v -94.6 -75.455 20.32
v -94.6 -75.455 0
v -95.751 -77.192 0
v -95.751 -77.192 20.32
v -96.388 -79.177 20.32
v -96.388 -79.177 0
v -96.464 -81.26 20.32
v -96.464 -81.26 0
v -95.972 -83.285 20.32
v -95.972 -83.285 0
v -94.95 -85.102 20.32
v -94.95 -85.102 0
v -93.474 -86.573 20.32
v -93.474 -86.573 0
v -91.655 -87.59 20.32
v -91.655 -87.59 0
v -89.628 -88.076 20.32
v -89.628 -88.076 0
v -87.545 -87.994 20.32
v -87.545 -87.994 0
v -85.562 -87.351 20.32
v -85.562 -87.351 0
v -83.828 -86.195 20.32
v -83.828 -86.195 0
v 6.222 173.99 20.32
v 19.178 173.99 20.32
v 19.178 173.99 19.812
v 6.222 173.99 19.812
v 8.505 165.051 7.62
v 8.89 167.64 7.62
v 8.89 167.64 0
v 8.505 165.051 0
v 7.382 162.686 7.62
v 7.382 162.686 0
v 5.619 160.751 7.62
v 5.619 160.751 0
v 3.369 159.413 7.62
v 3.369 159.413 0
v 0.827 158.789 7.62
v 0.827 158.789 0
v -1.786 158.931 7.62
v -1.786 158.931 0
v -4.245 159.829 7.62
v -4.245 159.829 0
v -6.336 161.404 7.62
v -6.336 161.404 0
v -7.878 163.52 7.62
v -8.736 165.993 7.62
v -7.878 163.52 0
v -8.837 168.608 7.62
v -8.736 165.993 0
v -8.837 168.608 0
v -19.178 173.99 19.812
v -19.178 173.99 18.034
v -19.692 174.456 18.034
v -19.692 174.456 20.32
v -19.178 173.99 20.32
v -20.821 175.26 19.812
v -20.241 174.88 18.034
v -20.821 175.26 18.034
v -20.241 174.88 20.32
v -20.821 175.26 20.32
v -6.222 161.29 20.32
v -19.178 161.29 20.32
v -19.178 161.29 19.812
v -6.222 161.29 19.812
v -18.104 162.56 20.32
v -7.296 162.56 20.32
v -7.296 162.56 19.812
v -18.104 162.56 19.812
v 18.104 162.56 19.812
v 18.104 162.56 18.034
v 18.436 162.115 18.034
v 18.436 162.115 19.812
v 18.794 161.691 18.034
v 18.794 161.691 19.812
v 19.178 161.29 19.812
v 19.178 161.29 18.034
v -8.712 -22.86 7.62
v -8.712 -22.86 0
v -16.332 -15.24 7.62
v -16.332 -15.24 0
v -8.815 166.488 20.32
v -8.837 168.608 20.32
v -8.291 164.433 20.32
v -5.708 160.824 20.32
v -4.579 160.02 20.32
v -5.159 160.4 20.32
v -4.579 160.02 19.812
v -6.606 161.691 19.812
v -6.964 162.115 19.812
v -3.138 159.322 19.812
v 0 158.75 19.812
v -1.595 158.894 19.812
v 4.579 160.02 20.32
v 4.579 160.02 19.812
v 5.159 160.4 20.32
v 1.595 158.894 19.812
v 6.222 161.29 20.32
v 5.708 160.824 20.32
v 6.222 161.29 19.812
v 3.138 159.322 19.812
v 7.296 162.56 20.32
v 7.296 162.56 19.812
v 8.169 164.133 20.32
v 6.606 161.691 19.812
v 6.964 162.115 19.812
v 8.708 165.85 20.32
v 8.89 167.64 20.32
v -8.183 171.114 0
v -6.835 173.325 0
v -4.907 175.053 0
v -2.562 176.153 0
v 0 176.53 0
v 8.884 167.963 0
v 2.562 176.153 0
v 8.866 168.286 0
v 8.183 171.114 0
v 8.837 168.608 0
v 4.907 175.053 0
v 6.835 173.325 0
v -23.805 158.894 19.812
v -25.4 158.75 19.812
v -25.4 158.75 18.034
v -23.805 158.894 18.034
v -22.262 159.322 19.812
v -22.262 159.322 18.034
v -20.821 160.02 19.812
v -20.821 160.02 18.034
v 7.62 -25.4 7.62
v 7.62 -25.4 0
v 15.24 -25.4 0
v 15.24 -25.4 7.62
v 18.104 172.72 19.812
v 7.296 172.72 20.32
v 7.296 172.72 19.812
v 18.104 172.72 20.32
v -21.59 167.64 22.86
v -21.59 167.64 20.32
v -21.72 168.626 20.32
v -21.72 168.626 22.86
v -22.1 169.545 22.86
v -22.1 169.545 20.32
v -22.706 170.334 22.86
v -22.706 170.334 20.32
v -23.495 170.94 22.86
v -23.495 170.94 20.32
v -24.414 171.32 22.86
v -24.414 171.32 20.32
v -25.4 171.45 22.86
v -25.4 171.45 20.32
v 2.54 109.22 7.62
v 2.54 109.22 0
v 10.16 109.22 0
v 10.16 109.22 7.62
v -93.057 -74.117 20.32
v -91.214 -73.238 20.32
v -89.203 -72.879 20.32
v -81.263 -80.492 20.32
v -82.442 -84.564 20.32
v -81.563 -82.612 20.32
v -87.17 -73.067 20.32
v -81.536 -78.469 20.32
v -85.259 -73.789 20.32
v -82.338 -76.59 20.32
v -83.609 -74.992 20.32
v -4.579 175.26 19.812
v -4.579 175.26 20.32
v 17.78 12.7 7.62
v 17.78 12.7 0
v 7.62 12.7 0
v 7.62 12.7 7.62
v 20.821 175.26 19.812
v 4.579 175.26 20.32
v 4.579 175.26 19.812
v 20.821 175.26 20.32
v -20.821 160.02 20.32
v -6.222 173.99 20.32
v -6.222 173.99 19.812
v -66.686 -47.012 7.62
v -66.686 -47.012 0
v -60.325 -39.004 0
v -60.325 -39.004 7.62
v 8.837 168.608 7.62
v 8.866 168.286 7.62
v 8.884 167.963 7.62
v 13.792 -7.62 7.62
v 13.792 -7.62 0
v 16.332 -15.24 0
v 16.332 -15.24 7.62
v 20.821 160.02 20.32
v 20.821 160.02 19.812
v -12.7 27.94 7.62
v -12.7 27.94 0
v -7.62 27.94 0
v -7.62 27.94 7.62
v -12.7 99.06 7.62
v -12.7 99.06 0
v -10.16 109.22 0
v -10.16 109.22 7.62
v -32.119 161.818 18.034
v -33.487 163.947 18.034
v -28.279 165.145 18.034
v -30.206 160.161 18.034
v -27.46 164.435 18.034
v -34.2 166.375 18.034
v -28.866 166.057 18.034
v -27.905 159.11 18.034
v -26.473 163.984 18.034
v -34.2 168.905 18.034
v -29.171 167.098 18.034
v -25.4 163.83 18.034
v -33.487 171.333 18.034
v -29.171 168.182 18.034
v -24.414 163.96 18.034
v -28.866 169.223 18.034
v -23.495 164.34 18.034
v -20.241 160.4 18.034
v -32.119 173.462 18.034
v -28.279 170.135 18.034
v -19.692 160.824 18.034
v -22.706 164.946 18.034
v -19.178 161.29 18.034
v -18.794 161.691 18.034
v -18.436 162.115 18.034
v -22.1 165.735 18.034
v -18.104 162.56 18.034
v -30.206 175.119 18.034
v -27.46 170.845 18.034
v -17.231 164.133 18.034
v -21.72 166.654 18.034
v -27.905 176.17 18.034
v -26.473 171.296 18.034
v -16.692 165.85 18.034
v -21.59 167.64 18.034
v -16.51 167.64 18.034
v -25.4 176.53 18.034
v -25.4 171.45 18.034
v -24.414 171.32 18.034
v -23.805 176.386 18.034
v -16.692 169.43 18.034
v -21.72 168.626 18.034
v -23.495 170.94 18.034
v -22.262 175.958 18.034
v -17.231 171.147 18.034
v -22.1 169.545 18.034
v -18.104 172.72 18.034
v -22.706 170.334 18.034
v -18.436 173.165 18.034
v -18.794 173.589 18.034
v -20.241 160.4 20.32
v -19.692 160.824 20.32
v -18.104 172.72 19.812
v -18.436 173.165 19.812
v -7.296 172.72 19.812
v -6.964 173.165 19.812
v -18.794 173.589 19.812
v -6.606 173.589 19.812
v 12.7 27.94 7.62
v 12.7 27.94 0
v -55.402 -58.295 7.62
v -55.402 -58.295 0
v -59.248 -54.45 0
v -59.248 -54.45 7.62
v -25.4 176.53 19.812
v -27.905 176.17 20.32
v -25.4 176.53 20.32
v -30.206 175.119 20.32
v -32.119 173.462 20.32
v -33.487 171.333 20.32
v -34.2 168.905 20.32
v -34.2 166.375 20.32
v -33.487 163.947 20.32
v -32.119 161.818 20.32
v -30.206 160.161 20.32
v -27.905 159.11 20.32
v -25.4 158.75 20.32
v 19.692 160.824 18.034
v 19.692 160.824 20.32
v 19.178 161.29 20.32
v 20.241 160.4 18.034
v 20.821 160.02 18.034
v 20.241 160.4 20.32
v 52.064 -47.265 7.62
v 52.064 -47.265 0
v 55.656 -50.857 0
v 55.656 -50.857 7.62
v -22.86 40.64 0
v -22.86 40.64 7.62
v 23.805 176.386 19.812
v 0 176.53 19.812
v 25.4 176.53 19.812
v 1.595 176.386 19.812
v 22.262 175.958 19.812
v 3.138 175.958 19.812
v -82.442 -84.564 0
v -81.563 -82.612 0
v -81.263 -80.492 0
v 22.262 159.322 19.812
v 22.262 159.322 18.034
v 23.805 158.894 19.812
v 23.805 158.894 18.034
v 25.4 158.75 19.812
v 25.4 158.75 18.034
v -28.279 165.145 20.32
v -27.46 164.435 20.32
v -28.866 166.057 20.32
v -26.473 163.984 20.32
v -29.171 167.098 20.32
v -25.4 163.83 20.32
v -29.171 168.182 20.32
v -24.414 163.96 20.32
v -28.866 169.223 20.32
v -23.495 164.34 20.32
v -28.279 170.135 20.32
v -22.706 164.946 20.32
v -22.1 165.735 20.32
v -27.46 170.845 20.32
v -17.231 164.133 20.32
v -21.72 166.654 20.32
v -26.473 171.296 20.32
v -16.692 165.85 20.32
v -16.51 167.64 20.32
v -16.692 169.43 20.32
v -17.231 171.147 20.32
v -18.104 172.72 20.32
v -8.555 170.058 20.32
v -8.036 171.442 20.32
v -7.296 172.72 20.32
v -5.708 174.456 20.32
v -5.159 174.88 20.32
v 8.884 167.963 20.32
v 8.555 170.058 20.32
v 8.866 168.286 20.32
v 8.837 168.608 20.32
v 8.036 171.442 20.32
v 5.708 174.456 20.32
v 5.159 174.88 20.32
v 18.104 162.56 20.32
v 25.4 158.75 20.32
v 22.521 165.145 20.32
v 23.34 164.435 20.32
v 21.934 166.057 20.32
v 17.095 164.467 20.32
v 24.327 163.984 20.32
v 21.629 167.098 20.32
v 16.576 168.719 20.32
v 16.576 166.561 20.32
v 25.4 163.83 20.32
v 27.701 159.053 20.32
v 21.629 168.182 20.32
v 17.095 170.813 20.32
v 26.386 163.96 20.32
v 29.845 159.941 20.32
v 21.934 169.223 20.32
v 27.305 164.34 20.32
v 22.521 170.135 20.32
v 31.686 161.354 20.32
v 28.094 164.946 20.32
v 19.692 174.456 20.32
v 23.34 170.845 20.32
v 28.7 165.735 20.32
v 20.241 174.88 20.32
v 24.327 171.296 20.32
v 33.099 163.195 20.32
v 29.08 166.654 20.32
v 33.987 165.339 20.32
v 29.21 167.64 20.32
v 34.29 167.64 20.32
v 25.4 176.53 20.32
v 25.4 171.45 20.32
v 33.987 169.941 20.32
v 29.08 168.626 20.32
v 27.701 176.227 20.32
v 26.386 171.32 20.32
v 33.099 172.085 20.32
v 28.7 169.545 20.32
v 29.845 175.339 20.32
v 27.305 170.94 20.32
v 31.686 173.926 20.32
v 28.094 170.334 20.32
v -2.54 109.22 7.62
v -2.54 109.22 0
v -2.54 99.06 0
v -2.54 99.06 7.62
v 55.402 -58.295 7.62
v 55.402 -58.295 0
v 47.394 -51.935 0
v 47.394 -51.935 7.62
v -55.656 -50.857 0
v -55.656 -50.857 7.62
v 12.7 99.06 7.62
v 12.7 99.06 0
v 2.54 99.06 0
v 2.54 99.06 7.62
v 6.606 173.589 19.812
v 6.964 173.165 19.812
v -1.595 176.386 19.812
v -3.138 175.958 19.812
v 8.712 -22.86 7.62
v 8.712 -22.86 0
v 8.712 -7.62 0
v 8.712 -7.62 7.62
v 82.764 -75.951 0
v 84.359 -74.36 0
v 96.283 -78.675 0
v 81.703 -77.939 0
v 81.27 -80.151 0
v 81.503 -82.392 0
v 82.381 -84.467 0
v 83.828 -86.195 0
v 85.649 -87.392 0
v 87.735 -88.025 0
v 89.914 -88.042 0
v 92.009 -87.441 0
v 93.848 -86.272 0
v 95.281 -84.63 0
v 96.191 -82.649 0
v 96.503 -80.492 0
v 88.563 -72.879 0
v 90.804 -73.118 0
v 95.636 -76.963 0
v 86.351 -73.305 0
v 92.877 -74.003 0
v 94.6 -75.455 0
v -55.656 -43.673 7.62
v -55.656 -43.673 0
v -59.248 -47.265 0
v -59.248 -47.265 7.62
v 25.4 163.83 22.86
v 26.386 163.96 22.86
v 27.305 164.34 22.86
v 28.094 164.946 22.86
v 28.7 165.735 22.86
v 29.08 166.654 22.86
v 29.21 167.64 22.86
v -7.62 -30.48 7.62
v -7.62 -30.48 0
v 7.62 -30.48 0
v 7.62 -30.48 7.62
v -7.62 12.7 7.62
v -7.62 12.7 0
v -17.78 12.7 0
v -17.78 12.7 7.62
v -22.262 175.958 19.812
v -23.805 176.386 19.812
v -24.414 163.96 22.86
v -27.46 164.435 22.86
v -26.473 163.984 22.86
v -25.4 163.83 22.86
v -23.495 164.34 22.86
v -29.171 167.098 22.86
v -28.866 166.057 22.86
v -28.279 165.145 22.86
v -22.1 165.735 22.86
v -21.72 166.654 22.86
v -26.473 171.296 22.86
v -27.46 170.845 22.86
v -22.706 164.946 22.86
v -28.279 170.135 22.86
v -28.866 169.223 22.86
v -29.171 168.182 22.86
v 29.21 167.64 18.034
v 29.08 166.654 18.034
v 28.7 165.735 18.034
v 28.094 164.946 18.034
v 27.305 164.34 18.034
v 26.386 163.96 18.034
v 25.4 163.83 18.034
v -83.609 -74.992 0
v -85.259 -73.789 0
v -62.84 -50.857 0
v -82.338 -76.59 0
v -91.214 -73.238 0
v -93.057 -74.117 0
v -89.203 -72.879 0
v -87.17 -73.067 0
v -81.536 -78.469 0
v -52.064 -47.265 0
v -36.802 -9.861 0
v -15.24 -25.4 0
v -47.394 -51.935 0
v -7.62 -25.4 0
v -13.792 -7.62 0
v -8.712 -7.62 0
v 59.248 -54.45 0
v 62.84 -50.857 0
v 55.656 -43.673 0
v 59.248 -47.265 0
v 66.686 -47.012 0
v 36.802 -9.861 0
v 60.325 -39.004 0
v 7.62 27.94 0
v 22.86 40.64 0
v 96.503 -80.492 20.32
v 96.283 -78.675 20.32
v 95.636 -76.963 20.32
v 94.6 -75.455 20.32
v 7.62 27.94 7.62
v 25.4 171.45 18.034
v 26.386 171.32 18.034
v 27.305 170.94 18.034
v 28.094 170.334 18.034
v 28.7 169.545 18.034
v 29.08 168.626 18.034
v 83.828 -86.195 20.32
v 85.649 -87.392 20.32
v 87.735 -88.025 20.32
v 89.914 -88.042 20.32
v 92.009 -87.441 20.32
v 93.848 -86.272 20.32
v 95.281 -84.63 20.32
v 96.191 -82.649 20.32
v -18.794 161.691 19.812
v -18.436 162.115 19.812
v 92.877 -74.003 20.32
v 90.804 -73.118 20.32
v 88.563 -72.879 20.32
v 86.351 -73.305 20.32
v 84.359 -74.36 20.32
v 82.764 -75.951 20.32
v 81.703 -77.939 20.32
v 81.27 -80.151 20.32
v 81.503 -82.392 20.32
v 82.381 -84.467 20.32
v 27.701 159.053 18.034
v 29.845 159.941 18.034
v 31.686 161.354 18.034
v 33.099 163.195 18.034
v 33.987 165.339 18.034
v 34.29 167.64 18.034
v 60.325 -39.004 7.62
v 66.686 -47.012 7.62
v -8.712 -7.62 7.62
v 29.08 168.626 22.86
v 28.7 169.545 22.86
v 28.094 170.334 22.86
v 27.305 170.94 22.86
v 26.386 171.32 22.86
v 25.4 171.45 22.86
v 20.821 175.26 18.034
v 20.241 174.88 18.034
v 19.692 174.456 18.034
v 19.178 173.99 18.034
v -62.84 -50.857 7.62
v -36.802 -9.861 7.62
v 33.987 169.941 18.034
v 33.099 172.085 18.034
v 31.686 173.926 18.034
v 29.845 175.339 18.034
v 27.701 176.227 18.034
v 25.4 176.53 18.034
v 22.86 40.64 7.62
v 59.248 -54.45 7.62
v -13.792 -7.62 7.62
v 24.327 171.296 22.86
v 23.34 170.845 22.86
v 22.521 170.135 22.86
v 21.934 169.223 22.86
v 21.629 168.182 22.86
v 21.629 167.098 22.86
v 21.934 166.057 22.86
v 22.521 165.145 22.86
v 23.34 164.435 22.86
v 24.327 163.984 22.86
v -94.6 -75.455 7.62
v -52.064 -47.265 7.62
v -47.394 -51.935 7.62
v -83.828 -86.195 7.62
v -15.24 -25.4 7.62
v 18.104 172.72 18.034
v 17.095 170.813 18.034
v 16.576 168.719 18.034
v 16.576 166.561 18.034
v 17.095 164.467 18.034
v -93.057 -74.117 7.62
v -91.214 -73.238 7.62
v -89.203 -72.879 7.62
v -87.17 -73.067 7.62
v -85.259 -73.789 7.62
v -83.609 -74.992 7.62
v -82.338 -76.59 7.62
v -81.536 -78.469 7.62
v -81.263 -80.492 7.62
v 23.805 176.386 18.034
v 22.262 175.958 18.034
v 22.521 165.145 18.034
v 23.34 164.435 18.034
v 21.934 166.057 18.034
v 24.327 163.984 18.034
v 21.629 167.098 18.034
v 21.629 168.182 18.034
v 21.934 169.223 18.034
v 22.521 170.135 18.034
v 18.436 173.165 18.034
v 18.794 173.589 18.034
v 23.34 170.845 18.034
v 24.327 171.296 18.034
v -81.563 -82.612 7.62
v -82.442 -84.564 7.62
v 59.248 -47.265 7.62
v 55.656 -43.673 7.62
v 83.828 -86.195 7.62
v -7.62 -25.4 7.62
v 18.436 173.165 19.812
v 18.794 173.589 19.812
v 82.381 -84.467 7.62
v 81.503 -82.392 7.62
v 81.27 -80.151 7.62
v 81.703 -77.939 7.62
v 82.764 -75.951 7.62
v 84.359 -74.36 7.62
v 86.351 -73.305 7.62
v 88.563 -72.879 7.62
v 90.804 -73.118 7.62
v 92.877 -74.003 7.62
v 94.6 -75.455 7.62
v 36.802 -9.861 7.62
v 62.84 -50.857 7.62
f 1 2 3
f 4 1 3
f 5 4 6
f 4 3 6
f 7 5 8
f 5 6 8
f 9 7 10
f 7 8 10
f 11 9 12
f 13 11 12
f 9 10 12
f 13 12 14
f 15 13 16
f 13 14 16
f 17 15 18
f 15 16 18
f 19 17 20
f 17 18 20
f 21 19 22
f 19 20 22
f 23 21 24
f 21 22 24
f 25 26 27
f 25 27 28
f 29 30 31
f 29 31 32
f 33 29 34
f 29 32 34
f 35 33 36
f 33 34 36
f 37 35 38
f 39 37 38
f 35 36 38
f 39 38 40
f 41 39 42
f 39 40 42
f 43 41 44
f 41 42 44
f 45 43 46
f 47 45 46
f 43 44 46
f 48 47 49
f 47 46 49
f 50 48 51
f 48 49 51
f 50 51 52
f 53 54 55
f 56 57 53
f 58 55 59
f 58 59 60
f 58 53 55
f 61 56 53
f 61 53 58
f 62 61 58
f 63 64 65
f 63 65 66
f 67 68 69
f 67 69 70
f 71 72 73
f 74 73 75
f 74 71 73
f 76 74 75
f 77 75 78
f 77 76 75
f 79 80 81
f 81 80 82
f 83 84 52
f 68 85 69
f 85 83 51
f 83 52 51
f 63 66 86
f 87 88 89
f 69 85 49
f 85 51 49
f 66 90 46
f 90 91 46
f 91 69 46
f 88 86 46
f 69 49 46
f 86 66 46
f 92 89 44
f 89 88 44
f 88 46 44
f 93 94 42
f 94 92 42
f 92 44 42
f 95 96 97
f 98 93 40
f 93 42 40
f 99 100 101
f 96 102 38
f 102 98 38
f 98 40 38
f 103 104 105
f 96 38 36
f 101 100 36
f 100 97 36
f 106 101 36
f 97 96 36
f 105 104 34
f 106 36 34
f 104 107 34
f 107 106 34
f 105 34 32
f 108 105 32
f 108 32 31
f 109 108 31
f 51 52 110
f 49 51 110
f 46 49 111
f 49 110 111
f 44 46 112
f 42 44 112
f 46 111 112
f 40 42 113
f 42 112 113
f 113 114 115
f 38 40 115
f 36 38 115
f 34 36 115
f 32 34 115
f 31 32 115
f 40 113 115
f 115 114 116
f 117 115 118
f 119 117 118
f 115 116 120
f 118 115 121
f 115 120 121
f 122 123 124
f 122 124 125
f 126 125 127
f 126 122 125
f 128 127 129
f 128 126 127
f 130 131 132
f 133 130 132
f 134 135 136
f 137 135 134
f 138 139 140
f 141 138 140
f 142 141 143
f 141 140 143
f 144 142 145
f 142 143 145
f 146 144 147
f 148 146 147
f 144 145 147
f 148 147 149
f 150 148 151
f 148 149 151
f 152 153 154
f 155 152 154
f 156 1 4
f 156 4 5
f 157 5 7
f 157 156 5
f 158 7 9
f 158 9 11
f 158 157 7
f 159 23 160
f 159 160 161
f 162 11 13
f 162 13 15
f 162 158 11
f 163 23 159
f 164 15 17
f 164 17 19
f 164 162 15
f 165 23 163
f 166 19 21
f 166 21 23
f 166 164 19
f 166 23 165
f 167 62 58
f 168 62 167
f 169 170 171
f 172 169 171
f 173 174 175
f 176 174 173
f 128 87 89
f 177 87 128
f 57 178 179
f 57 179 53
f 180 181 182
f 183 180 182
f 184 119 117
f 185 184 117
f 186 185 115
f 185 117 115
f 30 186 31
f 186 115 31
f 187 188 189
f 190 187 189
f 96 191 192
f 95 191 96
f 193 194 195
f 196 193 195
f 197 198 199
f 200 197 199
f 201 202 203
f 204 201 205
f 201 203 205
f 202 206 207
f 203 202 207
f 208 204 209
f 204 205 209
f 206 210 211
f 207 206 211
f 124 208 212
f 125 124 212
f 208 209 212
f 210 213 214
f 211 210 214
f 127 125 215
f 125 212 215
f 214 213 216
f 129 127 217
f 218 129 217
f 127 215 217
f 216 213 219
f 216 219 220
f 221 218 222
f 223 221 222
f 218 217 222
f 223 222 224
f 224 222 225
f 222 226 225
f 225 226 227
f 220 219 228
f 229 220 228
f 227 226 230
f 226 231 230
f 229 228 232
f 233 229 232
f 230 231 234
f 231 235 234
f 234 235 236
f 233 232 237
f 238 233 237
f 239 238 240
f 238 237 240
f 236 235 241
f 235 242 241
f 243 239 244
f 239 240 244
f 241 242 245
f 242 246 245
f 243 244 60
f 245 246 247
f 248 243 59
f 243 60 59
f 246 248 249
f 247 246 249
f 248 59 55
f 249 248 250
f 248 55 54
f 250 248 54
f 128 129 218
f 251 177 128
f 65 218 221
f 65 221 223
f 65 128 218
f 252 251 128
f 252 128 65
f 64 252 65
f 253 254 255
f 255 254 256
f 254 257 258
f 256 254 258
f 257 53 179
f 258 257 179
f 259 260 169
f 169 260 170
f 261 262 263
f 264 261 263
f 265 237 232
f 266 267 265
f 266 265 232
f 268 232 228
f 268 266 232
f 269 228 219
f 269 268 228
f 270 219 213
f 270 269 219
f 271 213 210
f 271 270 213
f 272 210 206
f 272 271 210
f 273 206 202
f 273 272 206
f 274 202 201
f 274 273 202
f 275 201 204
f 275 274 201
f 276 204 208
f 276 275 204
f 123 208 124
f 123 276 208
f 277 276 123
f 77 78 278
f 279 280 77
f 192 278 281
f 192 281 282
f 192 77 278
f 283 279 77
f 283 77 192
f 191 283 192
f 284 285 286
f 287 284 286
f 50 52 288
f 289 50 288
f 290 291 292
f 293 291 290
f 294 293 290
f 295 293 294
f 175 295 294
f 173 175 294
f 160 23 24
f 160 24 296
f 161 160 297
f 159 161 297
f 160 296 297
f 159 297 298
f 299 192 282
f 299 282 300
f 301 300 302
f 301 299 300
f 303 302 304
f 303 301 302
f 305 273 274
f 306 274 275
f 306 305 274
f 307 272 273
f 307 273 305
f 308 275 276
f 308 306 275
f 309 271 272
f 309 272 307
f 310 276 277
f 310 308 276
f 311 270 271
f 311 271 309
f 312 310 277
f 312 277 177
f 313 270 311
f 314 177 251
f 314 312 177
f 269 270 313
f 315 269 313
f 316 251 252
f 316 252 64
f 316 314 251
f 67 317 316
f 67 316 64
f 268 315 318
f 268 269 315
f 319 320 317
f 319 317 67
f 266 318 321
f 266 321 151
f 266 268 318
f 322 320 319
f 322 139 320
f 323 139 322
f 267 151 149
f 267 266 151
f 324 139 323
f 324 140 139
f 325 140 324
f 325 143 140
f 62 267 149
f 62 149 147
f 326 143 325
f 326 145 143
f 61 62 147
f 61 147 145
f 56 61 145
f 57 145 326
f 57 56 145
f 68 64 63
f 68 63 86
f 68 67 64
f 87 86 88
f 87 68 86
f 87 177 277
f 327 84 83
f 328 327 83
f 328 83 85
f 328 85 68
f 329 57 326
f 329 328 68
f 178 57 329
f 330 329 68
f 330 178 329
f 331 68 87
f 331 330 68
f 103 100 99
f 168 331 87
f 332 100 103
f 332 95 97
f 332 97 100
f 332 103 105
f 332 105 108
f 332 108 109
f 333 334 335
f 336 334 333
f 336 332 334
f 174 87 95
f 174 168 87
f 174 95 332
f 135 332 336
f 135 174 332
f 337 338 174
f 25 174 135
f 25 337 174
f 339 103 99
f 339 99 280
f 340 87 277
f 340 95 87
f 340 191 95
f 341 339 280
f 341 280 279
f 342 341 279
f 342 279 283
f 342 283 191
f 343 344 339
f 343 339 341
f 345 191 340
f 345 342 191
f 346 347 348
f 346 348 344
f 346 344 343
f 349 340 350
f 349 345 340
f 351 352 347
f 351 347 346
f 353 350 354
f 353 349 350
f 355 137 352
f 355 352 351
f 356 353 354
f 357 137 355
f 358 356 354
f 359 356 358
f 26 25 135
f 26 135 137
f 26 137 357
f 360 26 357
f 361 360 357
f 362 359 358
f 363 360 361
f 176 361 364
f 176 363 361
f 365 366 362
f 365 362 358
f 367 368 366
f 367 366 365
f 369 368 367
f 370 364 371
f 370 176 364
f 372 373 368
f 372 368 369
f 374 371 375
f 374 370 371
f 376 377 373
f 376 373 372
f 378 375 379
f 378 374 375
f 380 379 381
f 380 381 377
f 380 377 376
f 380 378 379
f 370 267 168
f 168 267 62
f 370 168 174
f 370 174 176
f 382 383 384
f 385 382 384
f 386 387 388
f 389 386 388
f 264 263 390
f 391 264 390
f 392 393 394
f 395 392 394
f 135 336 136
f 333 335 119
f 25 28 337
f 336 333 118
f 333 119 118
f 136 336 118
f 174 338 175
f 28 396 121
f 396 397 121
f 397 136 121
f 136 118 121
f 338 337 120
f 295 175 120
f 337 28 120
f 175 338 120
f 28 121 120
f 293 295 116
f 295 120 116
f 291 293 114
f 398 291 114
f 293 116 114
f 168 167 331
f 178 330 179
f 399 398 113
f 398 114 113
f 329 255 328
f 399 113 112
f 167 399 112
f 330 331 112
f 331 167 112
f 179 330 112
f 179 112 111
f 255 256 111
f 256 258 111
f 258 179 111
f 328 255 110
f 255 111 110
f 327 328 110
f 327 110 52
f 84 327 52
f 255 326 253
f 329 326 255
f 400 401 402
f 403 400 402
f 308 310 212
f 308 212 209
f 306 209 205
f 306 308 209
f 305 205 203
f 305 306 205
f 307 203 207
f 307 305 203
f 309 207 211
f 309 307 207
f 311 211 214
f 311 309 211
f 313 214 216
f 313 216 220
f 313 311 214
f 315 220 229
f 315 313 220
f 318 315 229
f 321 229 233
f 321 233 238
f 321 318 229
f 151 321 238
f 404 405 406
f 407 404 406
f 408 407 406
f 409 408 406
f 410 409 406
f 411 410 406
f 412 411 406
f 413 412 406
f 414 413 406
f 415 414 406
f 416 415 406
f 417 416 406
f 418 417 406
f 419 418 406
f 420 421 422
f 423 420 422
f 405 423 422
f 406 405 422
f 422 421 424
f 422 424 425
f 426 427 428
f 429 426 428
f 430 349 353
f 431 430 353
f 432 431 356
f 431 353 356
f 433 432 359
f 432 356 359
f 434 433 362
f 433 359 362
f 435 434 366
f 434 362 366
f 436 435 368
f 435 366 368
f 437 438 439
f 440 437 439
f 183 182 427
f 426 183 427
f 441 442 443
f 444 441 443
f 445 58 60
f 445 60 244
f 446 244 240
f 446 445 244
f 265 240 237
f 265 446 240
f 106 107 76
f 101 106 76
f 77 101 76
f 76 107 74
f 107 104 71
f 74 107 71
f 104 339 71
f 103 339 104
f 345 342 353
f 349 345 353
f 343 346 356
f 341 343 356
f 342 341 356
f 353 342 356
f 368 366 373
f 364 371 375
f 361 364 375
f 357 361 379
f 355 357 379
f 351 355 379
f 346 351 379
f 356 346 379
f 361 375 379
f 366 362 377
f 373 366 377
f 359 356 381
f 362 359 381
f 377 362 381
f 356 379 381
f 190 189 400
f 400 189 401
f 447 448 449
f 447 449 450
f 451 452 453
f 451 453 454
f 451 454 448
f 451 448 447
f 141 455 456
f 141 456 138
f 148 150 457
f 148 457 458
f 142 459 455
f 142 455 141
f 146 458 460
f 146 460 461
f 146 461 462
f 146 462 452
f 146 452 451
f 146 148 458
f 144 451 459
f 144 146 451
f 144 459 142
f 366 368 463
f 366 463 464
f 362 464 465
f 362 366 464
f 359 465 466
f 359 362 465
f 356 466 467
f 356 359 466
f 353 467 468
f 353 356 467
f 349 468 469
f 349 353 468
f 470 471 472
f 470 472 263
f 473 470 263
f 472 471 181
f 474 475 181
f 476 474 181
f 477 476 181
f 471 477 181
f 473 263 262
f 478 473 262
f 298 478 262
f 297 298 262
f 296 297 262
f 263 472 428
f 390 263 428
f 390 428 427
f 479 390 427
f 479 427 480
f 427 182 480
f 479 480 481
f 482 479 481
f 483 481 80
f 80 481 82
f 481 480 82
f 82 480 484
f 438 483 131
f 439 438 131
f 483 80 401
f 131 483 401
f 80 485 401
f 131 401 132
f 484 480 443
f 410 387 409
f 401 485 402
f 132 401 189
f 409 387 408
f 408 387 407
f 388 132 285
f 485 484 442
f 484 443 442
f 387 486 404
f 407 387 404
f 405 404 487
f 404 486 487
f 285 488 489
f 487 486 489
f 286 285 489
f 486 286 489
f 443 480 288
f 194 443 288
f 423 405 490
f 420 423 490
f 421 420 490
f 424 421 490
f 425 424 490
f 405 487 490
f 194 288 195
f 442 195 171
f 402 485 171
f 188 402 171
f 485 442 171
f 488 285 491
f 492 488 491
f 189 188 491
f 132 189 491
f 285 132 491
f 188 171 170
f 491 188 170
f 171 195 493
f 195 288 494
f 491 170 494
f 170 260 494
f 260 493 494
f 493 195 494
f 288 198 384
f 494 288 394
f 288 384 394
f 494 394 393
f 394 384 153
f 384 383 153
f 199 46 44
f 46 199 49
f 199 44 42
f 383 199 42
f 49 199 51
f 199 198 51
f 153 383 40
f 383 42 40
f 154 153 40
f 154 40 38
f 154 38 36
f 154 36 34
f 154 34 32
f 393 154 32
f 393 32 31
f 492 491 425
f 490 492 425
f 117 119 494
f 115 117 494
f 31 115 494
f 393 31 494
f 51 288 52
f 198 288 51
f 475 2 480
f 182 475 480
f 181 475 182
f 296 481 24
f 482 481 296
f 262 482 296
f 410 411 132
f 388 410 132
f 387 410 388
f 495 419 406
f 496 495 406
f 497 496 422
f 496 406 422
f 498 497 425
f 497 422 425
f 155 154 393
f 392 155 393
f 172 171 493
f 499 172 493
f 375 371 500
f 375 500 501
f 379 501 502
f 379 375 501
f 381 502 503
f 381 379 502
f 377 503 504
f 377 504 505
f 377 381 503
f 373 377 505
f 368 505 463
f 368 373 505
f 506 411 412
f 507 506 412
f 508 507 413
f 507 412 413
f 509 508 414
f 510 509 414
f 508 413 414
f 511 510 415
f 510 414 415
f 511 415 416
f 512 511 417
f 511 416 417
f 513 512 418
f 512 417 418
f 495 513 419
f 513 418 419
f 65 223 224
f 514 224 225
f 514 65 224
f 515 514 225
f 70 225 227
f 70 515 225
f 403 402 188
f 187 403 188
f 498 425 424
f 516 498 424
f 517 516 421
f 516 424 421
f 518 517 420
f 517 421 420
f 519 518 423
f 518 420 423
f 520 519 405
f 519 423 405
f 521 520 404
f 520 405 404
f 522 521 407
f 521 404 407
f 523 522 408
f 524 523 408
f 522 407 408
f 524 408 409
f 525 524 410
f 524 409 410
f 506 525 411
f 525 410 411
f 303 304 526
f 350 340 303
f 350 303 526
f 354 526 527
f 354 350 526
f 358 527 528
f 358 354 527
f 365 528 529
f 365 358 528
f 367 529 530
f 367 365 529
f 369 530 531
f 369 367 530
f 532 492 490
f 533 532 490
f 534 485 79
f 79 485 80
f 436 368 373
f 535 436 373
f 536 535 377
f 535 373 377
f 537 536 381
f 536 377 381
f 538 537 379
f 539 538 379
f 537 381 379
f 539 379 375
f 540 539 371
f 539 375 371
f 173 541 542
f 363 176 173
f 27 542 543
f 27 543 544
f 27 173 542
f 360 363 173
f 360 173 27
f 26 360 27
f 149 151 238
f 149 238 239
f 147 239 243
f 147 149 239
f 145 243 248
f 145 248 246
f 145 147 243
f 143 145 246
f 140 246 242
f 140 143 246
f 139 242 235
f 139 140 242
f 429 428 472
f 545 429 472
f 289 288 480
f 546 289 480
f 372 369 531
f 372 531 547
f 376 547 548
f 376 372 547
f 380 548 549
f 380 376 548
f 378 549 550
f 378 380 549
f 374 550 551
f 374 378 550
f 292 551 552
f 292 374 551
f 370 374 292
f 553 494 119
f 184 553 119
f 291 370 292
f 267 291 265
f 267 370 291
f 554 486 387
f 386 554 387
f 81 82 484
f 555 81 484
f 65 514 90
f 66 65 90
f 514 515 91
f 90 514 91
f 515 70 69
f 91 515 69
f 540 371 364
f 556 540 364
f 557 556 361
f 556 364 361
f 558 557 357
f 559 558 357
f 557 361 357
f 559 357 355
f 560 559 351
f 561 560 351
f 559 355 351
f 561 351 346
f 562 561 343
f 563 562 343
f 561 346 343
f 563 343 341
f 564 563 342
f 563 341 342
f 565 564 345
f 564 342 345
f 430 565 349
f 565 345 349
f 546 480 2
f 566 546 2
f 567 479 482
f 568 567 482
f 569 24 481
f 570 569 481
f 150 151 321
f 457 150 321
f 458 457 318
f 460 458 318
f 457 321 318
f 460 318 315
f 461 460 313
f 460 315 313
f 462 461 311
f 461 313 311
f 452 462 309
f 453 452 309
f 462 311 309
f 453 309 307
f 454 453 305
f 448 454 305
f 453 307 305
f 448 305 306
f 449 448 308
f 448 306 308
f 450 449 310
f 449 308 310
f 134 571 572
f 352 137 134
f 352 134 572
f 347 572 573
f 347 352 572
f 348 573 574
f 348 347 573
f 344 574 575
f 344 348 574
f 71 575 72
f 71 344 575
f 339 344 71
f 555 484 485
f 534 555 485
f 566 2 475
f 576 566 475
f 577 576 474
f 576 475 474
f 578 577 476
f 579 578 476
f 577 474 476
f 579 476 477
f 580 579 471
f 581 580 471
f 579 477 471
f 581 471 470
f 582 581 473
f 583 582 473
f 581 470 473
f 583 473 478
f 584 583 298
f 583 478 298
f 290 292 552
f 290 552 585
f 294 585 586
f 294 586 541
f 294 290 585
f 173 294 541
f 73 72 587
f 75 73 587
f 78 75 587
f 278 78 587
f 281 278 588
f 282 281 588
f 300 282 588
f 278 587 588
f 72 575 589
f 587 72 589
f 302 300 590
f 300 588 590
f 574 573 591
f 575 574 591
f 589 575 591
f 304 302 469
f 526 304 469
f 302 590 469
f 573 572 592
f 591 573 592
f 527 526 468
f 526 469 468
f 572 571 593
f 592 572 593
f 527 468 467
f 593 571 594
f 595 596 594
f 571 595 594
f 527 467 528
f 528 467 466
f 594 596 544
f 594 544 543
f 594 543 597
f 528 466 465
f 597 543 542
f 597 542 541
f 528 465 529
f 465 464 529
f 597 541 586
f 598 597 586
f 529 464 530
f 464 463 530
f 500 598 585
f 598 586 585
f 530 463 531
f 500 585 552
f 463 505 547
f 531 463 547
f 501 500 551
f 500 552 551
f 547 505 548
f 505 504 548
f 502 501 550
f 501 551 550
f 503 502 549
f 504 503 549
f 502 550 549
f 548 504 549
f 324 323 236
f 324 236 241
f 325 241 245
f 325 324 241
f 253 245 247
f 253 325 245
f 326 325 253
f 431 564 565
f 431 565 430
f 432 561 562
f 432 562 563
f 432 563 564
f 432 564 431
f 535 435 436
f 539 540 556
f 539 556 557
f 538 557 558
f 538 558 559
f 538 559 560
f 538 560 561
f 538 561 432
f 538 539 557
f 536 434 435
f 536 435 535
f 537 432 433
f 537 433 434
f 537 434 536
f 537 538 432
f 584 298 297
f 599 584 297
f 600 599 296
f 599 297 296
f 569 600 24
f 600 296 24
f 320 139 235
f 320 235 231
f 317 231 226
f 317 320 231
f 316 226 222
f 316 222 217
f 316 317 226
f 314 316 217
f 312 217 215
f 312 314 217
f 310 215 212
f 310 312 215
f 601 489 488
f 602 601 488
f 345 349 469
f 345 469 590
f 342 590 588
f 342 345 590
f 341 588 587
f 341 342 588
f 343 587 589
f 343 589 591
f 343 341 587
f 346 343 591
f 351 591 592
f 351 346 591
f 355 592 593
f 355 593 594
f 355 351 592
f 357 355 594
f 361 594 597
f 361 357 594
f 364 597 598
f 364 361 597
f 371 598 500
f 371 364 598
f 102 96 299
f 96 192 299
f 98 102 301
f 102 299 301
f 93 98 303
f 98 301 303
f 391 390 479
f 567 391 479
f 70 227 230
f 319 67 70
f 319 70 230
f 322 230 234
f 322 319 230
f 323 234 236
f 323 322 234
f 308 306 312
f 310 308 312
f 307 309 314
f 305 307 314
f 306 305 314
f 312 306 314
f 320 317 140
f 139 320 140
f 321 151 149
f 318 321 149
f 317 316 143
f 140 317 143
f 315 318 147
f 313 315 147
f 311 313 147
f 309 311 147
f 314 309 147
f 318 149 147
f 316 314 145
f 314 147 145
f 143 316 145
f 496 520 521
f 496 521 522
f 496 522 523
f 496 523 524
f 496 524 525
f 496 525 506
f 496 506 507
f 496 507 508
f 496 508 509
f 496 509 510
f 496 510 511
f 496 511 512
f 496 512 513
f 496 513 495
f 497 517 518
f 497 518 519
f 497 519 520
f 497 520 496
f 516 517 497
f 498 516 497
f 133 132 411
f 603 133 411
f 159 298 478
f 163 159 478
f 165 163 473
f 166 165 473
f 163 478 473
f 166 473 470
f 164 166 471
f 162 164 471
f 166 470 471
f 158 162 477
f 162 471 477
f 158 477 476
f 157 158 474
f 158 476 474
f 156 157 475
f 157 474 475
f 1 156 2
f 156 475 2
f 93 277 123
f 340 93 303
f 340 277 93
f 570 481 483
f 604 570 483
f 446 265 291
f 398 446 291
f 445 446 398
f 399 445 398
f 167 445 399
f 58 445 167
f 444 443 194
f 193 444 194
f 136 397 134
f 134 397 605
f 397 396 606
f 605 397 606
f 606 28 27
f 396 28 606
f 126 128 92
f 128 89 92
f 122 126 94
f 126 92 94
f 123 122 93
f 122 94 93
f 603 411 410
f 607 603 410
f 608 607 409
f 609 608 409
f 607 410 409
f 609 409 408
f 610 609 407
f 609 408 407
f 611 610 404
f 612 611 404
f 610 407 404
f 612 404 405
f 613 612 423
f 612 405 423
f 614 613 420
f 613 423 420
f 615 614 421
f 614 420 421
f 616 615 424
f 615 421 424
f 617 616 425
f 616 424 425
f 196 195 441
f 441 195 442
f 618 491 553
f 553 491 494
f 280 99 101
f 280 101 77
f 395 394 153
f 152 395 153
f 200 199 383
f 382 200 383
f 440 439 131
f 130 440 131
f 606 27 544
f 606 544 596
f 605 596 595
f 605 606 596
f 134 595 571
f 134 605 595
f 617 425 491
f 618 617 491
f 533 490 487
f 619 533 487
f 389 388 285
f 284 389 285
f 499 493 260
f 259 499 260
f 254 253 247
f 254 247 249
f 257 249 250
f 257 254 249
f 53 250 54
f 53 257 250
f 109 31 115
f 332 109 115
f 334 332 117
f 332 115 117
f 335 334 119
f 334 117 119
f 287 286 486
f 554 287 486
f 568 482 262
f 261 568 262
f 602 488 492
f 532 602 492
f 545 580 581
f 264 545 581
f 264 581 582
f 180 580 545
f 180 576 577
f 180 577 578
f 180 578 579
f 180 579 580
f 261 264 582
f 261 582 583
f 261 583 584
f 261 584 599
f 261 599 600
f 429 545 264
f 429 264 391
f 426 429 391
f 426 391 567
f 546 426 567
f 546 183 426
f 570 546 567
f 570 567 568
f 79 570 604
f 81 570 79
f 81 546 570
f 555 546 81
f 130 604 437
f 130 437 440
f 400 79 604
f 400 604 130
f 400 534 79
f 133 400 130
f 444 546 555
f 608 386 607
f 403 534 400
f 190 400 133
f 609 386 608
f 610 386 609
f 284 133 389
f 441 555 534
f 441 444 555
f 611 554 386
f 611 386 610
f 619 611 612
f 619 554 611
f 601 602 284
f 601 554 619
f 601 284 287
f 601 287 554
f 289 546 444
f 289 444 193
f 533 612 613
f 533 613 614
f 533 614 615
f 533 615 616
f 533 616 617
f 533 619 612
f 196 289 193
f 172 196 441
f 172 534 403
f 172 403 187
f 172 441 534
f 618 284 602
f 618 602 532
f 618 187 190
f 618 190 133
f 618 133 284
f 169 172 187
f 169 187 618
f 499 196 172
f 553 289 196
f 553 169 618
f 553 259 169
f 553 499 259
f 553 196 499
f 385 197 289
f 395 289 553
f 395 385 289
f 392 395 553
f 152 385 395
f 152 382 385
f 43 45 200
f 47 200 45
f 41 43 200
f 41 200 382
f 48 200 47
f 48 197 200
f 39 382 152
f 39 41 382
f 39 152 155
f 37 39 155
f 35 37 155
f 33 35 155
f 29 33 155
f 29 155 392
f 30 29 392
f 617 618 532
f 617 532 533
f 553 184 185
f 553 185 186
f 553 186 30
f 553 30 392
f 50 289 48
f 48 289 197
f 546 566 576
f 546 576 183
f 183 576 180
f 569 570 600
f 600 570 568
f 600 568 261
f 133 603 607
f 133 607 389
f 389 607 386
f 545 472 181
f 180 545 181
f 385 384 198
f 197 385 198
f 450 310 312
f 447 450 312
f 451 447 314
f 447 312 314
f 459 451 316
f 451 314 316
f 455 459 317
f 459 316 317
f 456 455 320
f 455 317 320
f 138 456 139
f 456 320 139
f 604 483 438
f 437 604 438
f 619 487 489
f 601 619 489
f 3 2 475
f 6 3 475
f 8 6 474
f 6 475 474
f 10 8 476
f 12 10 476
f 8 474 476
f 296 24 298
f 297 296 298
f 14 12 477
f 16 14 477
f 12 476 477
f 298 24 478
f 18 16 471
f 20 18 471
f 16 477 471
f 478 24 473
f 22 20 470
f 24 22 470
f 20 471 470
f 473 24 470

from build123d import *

# Parameters (mm, degrees)
F1_DEPTH = 7.62
F2_DEPTH = 20.32
F4_DEPTH = 0.508
F5_DEPTH = 2.286
F6_DEPTH = 2.54


with BuildPart() as f1:
    # F0 (on Top) → F1 (new body)
    with BuildSketch(Plane.XY):
        with BuildLine():
            Line((94.5998428664, -75.4545931138), (36.8017739816, -9.8610056184))
            Line((36.8017739816, -9.8610056184), (15.24, -25.4))
            Line((15.24, -25.4), (83.8282511998, -86.1946768381))
            ThreePointArc((83.8282511998, -86.1946768381), (83.5024239133, -75.0962557957), (94.5998428664, -75.4545931138))
        make_face()
        Polygon((47.393896559, -51.9350811917), (52.0636297419, -47.2653480087), (55.6557321903, -50.8574504572), (59.2478346388, -54.4495529056), (55.4019981606, -58.2953893838), align=None, mode=Mode.SUBTRACT)
        Polygon((62.8399370872, -50.8574504572), (59.2478346388, -47.2653480087), (55.6557321903, -43.6732455603), (60.3254653733, -39.0035123773), (66.6857735654, -47.011613979), align=None, mode=Mode.SUBTRACT)
        with BuildLine():
            Line((-15.24, -25.4), (-36.8017739816, -9.8610056184))
            Line((-36.8017739816, -9.8610056184), (-94.5998428664, -75.4545931138))
            ThreePointArc((-94.5998428664, -75.4545931138), (-86.1901329282, -73.3638602648), (-81.2626798383, -80.4922956567))
            ThreePointArc((-81.2626798383, -80.4922956567), (-81.9336098924, -83.618767612), (-83.8282511998, -86.1946768381))
            Line((-83.8282511998, -86.1946768381), (-15.24, -25.4))
        make_face()
        Polygon((-60.3254653733, -39.0035123773), (-55.6557321903, -43.6732455603), (-59.2478346388, -47.2653480087), (-62.8399370872, -50.8574504572), (-66.6857735654, -47.011613979), align=None, mode=Mode.SUBTRACT)
        Polygon((-55.6557321903, -50.8574504572), (-52.0636297419, -47.2653480087), (-47.393896559, -51.9350811917), (-55.4019981606, -58.2953893838), (-59.2478346388, -54.4495529056), align=None, mode=Mode.SUBTRACT)
        Polygon((-22.86, 40.64), (-36.8017739816, -9.8610056184), (-15.24, -25.4), (-7.62, -25.4), (0, -25.4), (7.62, -25.4), (15.24, -25.4), (36.8017739816, -9.8610056184), (22.86, 40.64), (0, 40.64), align=None)
        Polygon((-8.711533621, -7.62), (-8.711533621, -15.24), (-8.711533621, -22.86), (-16.331533621, -15.24), (-13.791533621, -7.62), align=None, mode=Mode.SUBTRACT)
        Polygon((-7.62, 27.94), (-7.62, 20.32), (-7.62, 12.7), (-17.78, 12.7), (-12.7, 27.94), align=None, mode=Mode.SUBTRACT)
        Polygon((8.711533621, -22.86), (8.711533621, -15.24), (8.711533621, -7.62), (13.791533621, -7.62), (16.331533621, -15.24), align=None, mode=Mode.SUBTRACT)
        Polygon((17.78, 12.7), (7.62, 12.7), (7.62, 20.32), (7.62, 27.94), (12.7, 27.94), align=None, mode=Mode.SUBTRACT)
        Polygon((0, -25.4), (-7.62, -25.4), (-7.62, -30.48), (7.62, -30.48), (7.62, -25.4), align=None)
        with BuildLine():
            Line((-8.8371004239, 168.6083780763), (-22.86, 40.64))
            Line((-22.86, 40.64), (0, 40.64))
            Line((0, 40.64), (22.86, 40.64))
            Line((22.86, 40.64), (8.8371004239, 168.6083780763))
            ThreePointArc((8.8371004239, 168.6083780763), (8.8767652545, 168.1249109361), (8.89, 167.64))
            ThreePointArc((8.89, 167.64), (-0.4849109361, 158.7632347455), (-8.8371004239, 168.6083780763))
        make_face()
        Polygon((-12.7, 99.06), (-10.16, 109.22), (-2.54, 109.22), (-2.54, 104.14), (-2.54, 99.06), align=None, mode=Mode.SUBTRACT)
        Polygon((2.54, 99.06), (2.54, 104.14), (2.54, 109.22), (10.16, 109.22), (12.7, 99.06), align=None, mode=Mode.SUBTRACT)
    extrude(amount=F1_DEPTH)


with BuildPart() as f2:
    # F0 (on Top) → F2 (new body)
    with BuildSketch(Plane.XY):
        with BuildLine():
            ThreePointArc((8.8371004239, 168.6083780763), (0, 176.53), (-8.8371004239, 168.6083780763))
            ThreePointArc((-8.8371004239, 168.6083780763), (-0.4849109361, 158.7632347455), (8.89, 167.64))
            ThreePointArc((8.89, 167.64), (8.8767652545, 168.1249109361), (8.8371004239, 168.6083780763))
        make_face()
    extrude(amount=F2_DEPTH)

    # F3 (on face) → F4 (join)
    with BuildSketch(Plane.XY.offset(20.32)):
        with BuildLine():
            Line((0, 176.53), (-25.4, 176.53))
            ThreePointArc((-25.4, 176.53), (-23.0240475594, 176.2066183527), (-20.8209498802, 175.26))
            Line((-20.8209498802, 175.26), (-4.5790501198, 175.26))
            ThreePointArc((-4.5790501198, 175.26), (-2.3759524406, 176.2066183527), (0, 176.53))
        make_face()
        with BuildLine():
            Line((-6.2217039467, 173.99), (-19.1782960533, 173.99))
            ThreePointArc((-19.1782960533, 173.99), (-18.6115859925, 173.3801685744), (-18.1044054389, 172.72))
            Line((-18.1044054389, 172.72), (-7.2955945611, 172.72))
            ThreePointArc((-7.2955945611, 172.72), (-6.7884140075, 173.3801685744), (-6.2217039467, 173.99))
        make_face()
        with BuildLine():
            Line((19.1782960533, 173.99), (6.2217039467, 173.99))
            ThreePointArc((6.2217039467, 173.99), (6.7884140075, 173.3801685744), (7.2955945611, 172.72))
            Line((7.2955945611, 172.72), (18.1044054389, 172.72))
            ThreePointArc((18.1044054389, 172.72), (18.6115859925, 173.3801685744), (19.1782960533, 173.99))
        make_face()
        with BuildLine():
            Line((25.4, 176.53), (0, 176.53))
            ThreePointArc((0, 176.53), (2.3759524406, 176.2066183527), (4.5790501198, 175.26))
            Line((4.5790501198, 175.26), (20.8209498802, 175.26))
            ThreePointArc((20.8209498802, 175.26), (23.0240475594, 176.2066183527), (25.4, 176.53))
        make_face()
        with BuildLine():
            ThreePointArc((-18.1044054389, 162.56), (-18.6115859925, 161.8998314256), (-19.1782960533, 161.29))
            Line((-19.1782960533, 161.29), (-6.2217039467, 161.29))
            ThreePointArc((-6.2217039467, 161.29), (-6.7884140075, 161.8998314256), (-7.2955945611, 162.56))
            Line((-7.2955945611, 162.56), (-18.1044054389, 162.56))
        make_face()
        with BuildLine():
            ThreePointArc((-20.8209498802, 160.02), (-23.0240475594, 159.0733816473), (-25.4, 158.75))
            Line((-25.4, 158.75), (-1.406e-07, 158.75))
            ThreePointArc((-1.406e-07, 158.75), (-2.3759525084, 159.0733816661), (-4.5790501198, 160.02))
            Line((-4.5790501198, 160.02), (-20.8209498802, 160.02))
        make_face()
        with BuildLine():
            ThreePointArc((4.5790501198, 160.02), (2.3759523728, 159.0733816286), (-1.406e-07, 158.75))
            Line((-1.406e-07, 158.75), (25.4, 158.75))
            ThreePointArc((25.4, 158.75), (23.0240475594, 159.0733816473), (20.8209498802, 160.02))
            Line((20.8209498802, 160.02), (4.5790501198, 160.02))
        make_face()
        with BuildLine():
            ThreePointArc((7.2955945611, 162.56), (6.7884140075, 161.8998314256), (6.2217039467, 161.29))
            Line((6.2217039467, 161.29), (19.1782960533, 161.29))
            ThreePointArc((19.1782960533, 161.29), (18.6115859925, 161.8998314256), (18.1044054389, 162.56))
            Line((18.1044054389, 162.56), (7.2955945611, 162.56))
        make_face()
    extrude(amount=-F4_DEPTH)

    # F3 (on face) → F5 (join)
    with BuildSketch(Plane.XY.offset(20.32)):
        with BuildLine():
            Line((-25.4, 175.26), (-25.4, 176.53))
            ThreePointArc((-25.4, 176.53), (-34.29, 167.64), (-25.4, 158.75))
            Line((-25.4, 158.75), (-25.4, 160.02))
            Line((-25.4, 160.02), (-25.4, 161.29))
            Line((-25.4, 161.29), (-25.4, 162.56))
            Line((-25.4, 162.56), (-25.4, 163.83))
            ThreePointArc((-25.4, 163.83), (-29.21, 167.64), (-25.4, 171.45))
            Line((-25.4, 171.45), (-25.4, 172.72))
            Line((-25.4, 172.72), (-25.4, 173.99))
            Line((-25.4, 173.99), (-25.4, 175.26))
        make_face()
        with BuildLine():
            Line((-18.1044054389, 172.72), (-25.4, 172.72))
            Line((-25.4, 172.72), (-25.4, 171.45))
            ThreePointArc((-25.4, 171.45), (-22.7059231637, 170.3340768363), (-21.59, 167.64))
            ThreePointArc((-21.59, 167.64), (-22.7059231637, 164.9459231637), (-25.4, 163.83))
            Line((-25.4, 163.83), (-25.4, 162.56))
            Line((-25.4, 162.56), (-18.1044054389, 162.56))
            ThreePointArc((-18.1044054389, 162.56), (-16.9179620477, 164.9778331803), (-16.51, 167.64))
            ThreePointArc((-16.51, 167.64), (-16.9179620477, 170.3021668197), (-18.1044054389, 172.72))
        make_face()
        with BuildLine():
            Line((-19.1782960533, 173.99), (-25.4, 173.99))
            Line((-25.4, 173.99), (-25.4, 172.72))
            Line((-25.4, 172.72), (-18.1044054389, 172.72))
            ThreePointArc((-18.1044054389, 172.72), (-18.6115859925, 173.3801685744), (-19.1782960533, 173.99))
        make_face()
        with BuildLine():
            Line((-20.8209498802, 175.26), (-25.4, 175.26))
            Line((-25.4, 175.26), (-25.4, 173.99))
            Line((-25.4, 173.99), (-19.1782960533, 173.99))
            ThreePointArc((-19.1782960533, 173.99), (-19.9624180833, 174.6731218459), (-20.8209498802, 175.26))
        make_face()
        with BuildLine():
            ThreePointArc((-20.8209498802, 175.26), (-23.0240475594, 176.2066183527), (-25.4, 176.53))
            Line((-25.4, 176.53), (-25.4, 175.26))
            Line((-25.4, 175.26), (-20.8209498802, 175.26))
        make_face()
        with BuildLine():
            Line((-25.4, 162.56), (-25.4, 161.29))
            Line((-25.4, 161.29), (-19.1782960533, 161.29))
            ThreePointArc((-19.1782960533, 161.29), (-18.6115859925, 161.8998314256), (-18.1044054389, 162.56))
            Line((-18.1044054389, 162.56), (-25.4, 162.56))
        make_face()
        with BuildLine():
            Line((-25.4, 161.29), (-25.4, 160.02))
            Line((-25.4, 160.02), (-20.8209498802, 160.02))
            ThreePointArc((-20.8209498802, 160.02), (-19.9624180833, 160.6068781541), (-19.1782960533, 161.29))
            Line((-19.1782960533, 161.29), (-25.4, 161.29))
        make_face()
        with BuildLine():
            Line((-25.4, 160.02), (-25.4, 158.75))
            ThreePointArc((-25.4, 158.75), (-23.0240475594, 159.0733816473), (-20.8209498802, 160.02))
            Line((-20.8209498802, 160.02), (-25.4, 160.02))
        make_face()
        with BuildLine():
            Line((25.4, 171.45), (25.4, 172.72))
            Line((25.4, 172.72), (18.1044054389, 172.72))
            ThreePointArc((18.1044054389, 172.72), (16.51, 167.64), (18.1044054389, 162.56))
            Line((18.1044054389, 162.56), (25.4, 162.56))
            Line((25.4, 162.56), (25.4, 163.83))
            ThreePointArc((25.4, 163.83), (21.59, 167.64), (25.4, 171.45))
        make_face()
        with BuildLine():
            ThreePointArc((34.29, 167.64), (31.6861792847, 173.9261792847), (25.4, 176.53))
            Line((25.4, 176.53), (25.4, 175.26))
            Line((25.4, 175.26), (25.4, 173.99))
            Line((25.4, 173.99), (25.4, 172.72))
            Line((25.4, 172.72), (25.4, 171.45))
            ThreePointArc((25.4, 171.45), (28.0940768363, 170.3340768363), (29.21, 167.64))
            ThreePointArc((29.21, 167.64), (28.0940768363, 164.9459231637), (25.4, 163.83))
            Line((25.4, 163.83), (25.4, 162.56))
            Line((25.4, 162.56), (25.4, 161.29))
            Line((25.4, 161.29), (25.4, 160.02))
            Line((25.4, 160.02), (25.4, 158.75))
            ThreePointArc((25.4, 158.75), (31.6861792847, 161.3538207153), (34.29, 167.64))
        make_face()
        with BuildLine():
            Line((25.4, 172.72), (25.4, 173.99))
            Line((25.4, 173.99), (19.1782960533, 173.99))
            ThreePointArc((19.1782960533, 173.99), (18.6115859925, 173.3801685744), (18.1044054389, 172.72))
            Line((18.1044054389, 172.72), (25.4, 172.72))
        make_face()
        with BuildLine():
            Line((25.4, 173.99), (25.4, 175.26))
            Line((25.4, 175.26), (20.8209498802, 175.26))
            ThreePointArc((20.8209498802, 175.26), (19.9624180833, 174.6731218459), (19.1782960533, 173.99))
            Line((19.1782960533, 173.99), (25.4, 173.99))
        make_face()
        with BuildLine():
            Line((25.4, 175.26), (25.4, 176.53))
            ThreePointArc((25.4, 176.53), (23.0240475594, 176.2066183527), (20.8209498802, 175.26))
            Line((20.8209498802, 175.26), (25.4, 175.26))
        make_face()
        with BuildLine():
            Line((19.1782960533, 161.29), (25.4, 161.29))
            Line((25.4, 161.29), (25.4, 162.56))
            Line((25.4, 162.56), (18.1044054389, 162.56))
            ThreePointArc((18.1044054389, 162.56), (18.6115859925, 161.8998314256), (19.1782960533, 161.29))
        make_face()
        with BuildLine():
            Line((20.8209498802, 160.02), (25.4, 160.02))
            Line((25.4, 160.02), (25.4, 161.29))
            Line((25.4, 161.29), (19.1782960533, 161.29))
            ThreePointArc((19.1782960533, 161.29), (19.9624180833, 160.6068781541), (20.8209498802, 160.02))
        make_face()
        with BuildLine():
            ThreePointArc((20.8209498802, 160.02), (23.0240475594, 159.0733816473), (25.4, 158.75))
            Line((25.4, 158.75), (25.4, 160.02))
            Line((25.4, 160.02), (20.8209498802, 160.02))
        make_face()
    extrude(amount=-F5_DEPTH)


with BuildPart() as f2b:
    # F0 (on Top) → F2, piece 2 (new body)
    with BuildSketch(Plane.XY):
        with BuildLine():
            ThreePointArc((96.5026798383, -80.4922956567), (96.0111152302, -77.7997487466), (94.5998428664, -75.4545931138))
            ThreePointArc((94.5998428664, -75.4545931138), (83.5024239133, -75.0962557957), (83.8282511998, -86.1946768381))
            ThreePointArc((83.8282511998, -86.1946768381), (92.0091517936, -87.4413656026), (96.5026798383, -80.4922956567))
        make_face()
    extrude(amount=F2_DEPTH)


with BuildPart() as f2c:
    # F0 (on Top) → F2, piece 3 (new body)
    with BuildSketch(Plane.XY):
        with BuildLine():
            ThreePointArc((-81.2626798383, -80.4922956567), (-86.1901329282, -73.3638602648), (-94.5998428664, -75.4545931138))
            ThreePointArc((-94.5998428664, -75.4545931138), (-94.2629357633, -85.8883355177), (-83.8282511998, -86.1946768381))
            ThreePointArc((-83.8282511998, -86.1946768381), (-81.9336098924, -83.618767612), (-81.2626798383, -80.4922956567))
        make_face()
    extrude(amount=F2_DEPTH)


with BuildPart() as f6:
    # F3 (on face) → F6 (new body)
    with BuildSketch(Plane.XY.offset(20.32)):
        with BuildLine():
            ThreePointArc((29.21, 167.64), (28.0940768363, 170.3340768363), (25.4, 171.45))
            Line((25.4, 171.45), (25.4, 163.83))
            ThreePointArc((25.4, 163.83), (28.0940768363, 164.9459231637), (29.21, 167.64))
        make_face()
        with BuildLine():
            Line((25.4, 163.83), (25.4, 171.45))
            ThreePointArc((25.4, 171.45), (21.59, 167.64), (25.4, 163.83))
        make_face()
    extrude(amount=F6_DEPTH)


with BuildPart() as f6b:
    # F3 (on face) → F6, piece 2 (new body)
    with BuildSketch(Plane.XY.offset(20.32)):
        with BuildLine():
            ThreePointArc((-21.59, 167.64), (-22.7059231637, 170.3340768363), (-25.4, 171.45))
            Line((-25.4, 171.45), (-25.4, 163.83))
            ThreePointArc((-25.4, 163.83), (-22.7059231637, 164.9459231637), (-21.59, 167.64))
        make_face()
        with BuildLine():
            Line((-25.4, 163.83), (-25.4, 171.45))
            ThreePointArc((-25.4, 171.45), (-29.21, 167.64), (-25.4, 163.83))
        make_face()
    extrude(amount=F6_DEPTH)


solid = Compound([f1.part, f2.part, f2b.part, f2c.part, f6.part, f6b.part])
